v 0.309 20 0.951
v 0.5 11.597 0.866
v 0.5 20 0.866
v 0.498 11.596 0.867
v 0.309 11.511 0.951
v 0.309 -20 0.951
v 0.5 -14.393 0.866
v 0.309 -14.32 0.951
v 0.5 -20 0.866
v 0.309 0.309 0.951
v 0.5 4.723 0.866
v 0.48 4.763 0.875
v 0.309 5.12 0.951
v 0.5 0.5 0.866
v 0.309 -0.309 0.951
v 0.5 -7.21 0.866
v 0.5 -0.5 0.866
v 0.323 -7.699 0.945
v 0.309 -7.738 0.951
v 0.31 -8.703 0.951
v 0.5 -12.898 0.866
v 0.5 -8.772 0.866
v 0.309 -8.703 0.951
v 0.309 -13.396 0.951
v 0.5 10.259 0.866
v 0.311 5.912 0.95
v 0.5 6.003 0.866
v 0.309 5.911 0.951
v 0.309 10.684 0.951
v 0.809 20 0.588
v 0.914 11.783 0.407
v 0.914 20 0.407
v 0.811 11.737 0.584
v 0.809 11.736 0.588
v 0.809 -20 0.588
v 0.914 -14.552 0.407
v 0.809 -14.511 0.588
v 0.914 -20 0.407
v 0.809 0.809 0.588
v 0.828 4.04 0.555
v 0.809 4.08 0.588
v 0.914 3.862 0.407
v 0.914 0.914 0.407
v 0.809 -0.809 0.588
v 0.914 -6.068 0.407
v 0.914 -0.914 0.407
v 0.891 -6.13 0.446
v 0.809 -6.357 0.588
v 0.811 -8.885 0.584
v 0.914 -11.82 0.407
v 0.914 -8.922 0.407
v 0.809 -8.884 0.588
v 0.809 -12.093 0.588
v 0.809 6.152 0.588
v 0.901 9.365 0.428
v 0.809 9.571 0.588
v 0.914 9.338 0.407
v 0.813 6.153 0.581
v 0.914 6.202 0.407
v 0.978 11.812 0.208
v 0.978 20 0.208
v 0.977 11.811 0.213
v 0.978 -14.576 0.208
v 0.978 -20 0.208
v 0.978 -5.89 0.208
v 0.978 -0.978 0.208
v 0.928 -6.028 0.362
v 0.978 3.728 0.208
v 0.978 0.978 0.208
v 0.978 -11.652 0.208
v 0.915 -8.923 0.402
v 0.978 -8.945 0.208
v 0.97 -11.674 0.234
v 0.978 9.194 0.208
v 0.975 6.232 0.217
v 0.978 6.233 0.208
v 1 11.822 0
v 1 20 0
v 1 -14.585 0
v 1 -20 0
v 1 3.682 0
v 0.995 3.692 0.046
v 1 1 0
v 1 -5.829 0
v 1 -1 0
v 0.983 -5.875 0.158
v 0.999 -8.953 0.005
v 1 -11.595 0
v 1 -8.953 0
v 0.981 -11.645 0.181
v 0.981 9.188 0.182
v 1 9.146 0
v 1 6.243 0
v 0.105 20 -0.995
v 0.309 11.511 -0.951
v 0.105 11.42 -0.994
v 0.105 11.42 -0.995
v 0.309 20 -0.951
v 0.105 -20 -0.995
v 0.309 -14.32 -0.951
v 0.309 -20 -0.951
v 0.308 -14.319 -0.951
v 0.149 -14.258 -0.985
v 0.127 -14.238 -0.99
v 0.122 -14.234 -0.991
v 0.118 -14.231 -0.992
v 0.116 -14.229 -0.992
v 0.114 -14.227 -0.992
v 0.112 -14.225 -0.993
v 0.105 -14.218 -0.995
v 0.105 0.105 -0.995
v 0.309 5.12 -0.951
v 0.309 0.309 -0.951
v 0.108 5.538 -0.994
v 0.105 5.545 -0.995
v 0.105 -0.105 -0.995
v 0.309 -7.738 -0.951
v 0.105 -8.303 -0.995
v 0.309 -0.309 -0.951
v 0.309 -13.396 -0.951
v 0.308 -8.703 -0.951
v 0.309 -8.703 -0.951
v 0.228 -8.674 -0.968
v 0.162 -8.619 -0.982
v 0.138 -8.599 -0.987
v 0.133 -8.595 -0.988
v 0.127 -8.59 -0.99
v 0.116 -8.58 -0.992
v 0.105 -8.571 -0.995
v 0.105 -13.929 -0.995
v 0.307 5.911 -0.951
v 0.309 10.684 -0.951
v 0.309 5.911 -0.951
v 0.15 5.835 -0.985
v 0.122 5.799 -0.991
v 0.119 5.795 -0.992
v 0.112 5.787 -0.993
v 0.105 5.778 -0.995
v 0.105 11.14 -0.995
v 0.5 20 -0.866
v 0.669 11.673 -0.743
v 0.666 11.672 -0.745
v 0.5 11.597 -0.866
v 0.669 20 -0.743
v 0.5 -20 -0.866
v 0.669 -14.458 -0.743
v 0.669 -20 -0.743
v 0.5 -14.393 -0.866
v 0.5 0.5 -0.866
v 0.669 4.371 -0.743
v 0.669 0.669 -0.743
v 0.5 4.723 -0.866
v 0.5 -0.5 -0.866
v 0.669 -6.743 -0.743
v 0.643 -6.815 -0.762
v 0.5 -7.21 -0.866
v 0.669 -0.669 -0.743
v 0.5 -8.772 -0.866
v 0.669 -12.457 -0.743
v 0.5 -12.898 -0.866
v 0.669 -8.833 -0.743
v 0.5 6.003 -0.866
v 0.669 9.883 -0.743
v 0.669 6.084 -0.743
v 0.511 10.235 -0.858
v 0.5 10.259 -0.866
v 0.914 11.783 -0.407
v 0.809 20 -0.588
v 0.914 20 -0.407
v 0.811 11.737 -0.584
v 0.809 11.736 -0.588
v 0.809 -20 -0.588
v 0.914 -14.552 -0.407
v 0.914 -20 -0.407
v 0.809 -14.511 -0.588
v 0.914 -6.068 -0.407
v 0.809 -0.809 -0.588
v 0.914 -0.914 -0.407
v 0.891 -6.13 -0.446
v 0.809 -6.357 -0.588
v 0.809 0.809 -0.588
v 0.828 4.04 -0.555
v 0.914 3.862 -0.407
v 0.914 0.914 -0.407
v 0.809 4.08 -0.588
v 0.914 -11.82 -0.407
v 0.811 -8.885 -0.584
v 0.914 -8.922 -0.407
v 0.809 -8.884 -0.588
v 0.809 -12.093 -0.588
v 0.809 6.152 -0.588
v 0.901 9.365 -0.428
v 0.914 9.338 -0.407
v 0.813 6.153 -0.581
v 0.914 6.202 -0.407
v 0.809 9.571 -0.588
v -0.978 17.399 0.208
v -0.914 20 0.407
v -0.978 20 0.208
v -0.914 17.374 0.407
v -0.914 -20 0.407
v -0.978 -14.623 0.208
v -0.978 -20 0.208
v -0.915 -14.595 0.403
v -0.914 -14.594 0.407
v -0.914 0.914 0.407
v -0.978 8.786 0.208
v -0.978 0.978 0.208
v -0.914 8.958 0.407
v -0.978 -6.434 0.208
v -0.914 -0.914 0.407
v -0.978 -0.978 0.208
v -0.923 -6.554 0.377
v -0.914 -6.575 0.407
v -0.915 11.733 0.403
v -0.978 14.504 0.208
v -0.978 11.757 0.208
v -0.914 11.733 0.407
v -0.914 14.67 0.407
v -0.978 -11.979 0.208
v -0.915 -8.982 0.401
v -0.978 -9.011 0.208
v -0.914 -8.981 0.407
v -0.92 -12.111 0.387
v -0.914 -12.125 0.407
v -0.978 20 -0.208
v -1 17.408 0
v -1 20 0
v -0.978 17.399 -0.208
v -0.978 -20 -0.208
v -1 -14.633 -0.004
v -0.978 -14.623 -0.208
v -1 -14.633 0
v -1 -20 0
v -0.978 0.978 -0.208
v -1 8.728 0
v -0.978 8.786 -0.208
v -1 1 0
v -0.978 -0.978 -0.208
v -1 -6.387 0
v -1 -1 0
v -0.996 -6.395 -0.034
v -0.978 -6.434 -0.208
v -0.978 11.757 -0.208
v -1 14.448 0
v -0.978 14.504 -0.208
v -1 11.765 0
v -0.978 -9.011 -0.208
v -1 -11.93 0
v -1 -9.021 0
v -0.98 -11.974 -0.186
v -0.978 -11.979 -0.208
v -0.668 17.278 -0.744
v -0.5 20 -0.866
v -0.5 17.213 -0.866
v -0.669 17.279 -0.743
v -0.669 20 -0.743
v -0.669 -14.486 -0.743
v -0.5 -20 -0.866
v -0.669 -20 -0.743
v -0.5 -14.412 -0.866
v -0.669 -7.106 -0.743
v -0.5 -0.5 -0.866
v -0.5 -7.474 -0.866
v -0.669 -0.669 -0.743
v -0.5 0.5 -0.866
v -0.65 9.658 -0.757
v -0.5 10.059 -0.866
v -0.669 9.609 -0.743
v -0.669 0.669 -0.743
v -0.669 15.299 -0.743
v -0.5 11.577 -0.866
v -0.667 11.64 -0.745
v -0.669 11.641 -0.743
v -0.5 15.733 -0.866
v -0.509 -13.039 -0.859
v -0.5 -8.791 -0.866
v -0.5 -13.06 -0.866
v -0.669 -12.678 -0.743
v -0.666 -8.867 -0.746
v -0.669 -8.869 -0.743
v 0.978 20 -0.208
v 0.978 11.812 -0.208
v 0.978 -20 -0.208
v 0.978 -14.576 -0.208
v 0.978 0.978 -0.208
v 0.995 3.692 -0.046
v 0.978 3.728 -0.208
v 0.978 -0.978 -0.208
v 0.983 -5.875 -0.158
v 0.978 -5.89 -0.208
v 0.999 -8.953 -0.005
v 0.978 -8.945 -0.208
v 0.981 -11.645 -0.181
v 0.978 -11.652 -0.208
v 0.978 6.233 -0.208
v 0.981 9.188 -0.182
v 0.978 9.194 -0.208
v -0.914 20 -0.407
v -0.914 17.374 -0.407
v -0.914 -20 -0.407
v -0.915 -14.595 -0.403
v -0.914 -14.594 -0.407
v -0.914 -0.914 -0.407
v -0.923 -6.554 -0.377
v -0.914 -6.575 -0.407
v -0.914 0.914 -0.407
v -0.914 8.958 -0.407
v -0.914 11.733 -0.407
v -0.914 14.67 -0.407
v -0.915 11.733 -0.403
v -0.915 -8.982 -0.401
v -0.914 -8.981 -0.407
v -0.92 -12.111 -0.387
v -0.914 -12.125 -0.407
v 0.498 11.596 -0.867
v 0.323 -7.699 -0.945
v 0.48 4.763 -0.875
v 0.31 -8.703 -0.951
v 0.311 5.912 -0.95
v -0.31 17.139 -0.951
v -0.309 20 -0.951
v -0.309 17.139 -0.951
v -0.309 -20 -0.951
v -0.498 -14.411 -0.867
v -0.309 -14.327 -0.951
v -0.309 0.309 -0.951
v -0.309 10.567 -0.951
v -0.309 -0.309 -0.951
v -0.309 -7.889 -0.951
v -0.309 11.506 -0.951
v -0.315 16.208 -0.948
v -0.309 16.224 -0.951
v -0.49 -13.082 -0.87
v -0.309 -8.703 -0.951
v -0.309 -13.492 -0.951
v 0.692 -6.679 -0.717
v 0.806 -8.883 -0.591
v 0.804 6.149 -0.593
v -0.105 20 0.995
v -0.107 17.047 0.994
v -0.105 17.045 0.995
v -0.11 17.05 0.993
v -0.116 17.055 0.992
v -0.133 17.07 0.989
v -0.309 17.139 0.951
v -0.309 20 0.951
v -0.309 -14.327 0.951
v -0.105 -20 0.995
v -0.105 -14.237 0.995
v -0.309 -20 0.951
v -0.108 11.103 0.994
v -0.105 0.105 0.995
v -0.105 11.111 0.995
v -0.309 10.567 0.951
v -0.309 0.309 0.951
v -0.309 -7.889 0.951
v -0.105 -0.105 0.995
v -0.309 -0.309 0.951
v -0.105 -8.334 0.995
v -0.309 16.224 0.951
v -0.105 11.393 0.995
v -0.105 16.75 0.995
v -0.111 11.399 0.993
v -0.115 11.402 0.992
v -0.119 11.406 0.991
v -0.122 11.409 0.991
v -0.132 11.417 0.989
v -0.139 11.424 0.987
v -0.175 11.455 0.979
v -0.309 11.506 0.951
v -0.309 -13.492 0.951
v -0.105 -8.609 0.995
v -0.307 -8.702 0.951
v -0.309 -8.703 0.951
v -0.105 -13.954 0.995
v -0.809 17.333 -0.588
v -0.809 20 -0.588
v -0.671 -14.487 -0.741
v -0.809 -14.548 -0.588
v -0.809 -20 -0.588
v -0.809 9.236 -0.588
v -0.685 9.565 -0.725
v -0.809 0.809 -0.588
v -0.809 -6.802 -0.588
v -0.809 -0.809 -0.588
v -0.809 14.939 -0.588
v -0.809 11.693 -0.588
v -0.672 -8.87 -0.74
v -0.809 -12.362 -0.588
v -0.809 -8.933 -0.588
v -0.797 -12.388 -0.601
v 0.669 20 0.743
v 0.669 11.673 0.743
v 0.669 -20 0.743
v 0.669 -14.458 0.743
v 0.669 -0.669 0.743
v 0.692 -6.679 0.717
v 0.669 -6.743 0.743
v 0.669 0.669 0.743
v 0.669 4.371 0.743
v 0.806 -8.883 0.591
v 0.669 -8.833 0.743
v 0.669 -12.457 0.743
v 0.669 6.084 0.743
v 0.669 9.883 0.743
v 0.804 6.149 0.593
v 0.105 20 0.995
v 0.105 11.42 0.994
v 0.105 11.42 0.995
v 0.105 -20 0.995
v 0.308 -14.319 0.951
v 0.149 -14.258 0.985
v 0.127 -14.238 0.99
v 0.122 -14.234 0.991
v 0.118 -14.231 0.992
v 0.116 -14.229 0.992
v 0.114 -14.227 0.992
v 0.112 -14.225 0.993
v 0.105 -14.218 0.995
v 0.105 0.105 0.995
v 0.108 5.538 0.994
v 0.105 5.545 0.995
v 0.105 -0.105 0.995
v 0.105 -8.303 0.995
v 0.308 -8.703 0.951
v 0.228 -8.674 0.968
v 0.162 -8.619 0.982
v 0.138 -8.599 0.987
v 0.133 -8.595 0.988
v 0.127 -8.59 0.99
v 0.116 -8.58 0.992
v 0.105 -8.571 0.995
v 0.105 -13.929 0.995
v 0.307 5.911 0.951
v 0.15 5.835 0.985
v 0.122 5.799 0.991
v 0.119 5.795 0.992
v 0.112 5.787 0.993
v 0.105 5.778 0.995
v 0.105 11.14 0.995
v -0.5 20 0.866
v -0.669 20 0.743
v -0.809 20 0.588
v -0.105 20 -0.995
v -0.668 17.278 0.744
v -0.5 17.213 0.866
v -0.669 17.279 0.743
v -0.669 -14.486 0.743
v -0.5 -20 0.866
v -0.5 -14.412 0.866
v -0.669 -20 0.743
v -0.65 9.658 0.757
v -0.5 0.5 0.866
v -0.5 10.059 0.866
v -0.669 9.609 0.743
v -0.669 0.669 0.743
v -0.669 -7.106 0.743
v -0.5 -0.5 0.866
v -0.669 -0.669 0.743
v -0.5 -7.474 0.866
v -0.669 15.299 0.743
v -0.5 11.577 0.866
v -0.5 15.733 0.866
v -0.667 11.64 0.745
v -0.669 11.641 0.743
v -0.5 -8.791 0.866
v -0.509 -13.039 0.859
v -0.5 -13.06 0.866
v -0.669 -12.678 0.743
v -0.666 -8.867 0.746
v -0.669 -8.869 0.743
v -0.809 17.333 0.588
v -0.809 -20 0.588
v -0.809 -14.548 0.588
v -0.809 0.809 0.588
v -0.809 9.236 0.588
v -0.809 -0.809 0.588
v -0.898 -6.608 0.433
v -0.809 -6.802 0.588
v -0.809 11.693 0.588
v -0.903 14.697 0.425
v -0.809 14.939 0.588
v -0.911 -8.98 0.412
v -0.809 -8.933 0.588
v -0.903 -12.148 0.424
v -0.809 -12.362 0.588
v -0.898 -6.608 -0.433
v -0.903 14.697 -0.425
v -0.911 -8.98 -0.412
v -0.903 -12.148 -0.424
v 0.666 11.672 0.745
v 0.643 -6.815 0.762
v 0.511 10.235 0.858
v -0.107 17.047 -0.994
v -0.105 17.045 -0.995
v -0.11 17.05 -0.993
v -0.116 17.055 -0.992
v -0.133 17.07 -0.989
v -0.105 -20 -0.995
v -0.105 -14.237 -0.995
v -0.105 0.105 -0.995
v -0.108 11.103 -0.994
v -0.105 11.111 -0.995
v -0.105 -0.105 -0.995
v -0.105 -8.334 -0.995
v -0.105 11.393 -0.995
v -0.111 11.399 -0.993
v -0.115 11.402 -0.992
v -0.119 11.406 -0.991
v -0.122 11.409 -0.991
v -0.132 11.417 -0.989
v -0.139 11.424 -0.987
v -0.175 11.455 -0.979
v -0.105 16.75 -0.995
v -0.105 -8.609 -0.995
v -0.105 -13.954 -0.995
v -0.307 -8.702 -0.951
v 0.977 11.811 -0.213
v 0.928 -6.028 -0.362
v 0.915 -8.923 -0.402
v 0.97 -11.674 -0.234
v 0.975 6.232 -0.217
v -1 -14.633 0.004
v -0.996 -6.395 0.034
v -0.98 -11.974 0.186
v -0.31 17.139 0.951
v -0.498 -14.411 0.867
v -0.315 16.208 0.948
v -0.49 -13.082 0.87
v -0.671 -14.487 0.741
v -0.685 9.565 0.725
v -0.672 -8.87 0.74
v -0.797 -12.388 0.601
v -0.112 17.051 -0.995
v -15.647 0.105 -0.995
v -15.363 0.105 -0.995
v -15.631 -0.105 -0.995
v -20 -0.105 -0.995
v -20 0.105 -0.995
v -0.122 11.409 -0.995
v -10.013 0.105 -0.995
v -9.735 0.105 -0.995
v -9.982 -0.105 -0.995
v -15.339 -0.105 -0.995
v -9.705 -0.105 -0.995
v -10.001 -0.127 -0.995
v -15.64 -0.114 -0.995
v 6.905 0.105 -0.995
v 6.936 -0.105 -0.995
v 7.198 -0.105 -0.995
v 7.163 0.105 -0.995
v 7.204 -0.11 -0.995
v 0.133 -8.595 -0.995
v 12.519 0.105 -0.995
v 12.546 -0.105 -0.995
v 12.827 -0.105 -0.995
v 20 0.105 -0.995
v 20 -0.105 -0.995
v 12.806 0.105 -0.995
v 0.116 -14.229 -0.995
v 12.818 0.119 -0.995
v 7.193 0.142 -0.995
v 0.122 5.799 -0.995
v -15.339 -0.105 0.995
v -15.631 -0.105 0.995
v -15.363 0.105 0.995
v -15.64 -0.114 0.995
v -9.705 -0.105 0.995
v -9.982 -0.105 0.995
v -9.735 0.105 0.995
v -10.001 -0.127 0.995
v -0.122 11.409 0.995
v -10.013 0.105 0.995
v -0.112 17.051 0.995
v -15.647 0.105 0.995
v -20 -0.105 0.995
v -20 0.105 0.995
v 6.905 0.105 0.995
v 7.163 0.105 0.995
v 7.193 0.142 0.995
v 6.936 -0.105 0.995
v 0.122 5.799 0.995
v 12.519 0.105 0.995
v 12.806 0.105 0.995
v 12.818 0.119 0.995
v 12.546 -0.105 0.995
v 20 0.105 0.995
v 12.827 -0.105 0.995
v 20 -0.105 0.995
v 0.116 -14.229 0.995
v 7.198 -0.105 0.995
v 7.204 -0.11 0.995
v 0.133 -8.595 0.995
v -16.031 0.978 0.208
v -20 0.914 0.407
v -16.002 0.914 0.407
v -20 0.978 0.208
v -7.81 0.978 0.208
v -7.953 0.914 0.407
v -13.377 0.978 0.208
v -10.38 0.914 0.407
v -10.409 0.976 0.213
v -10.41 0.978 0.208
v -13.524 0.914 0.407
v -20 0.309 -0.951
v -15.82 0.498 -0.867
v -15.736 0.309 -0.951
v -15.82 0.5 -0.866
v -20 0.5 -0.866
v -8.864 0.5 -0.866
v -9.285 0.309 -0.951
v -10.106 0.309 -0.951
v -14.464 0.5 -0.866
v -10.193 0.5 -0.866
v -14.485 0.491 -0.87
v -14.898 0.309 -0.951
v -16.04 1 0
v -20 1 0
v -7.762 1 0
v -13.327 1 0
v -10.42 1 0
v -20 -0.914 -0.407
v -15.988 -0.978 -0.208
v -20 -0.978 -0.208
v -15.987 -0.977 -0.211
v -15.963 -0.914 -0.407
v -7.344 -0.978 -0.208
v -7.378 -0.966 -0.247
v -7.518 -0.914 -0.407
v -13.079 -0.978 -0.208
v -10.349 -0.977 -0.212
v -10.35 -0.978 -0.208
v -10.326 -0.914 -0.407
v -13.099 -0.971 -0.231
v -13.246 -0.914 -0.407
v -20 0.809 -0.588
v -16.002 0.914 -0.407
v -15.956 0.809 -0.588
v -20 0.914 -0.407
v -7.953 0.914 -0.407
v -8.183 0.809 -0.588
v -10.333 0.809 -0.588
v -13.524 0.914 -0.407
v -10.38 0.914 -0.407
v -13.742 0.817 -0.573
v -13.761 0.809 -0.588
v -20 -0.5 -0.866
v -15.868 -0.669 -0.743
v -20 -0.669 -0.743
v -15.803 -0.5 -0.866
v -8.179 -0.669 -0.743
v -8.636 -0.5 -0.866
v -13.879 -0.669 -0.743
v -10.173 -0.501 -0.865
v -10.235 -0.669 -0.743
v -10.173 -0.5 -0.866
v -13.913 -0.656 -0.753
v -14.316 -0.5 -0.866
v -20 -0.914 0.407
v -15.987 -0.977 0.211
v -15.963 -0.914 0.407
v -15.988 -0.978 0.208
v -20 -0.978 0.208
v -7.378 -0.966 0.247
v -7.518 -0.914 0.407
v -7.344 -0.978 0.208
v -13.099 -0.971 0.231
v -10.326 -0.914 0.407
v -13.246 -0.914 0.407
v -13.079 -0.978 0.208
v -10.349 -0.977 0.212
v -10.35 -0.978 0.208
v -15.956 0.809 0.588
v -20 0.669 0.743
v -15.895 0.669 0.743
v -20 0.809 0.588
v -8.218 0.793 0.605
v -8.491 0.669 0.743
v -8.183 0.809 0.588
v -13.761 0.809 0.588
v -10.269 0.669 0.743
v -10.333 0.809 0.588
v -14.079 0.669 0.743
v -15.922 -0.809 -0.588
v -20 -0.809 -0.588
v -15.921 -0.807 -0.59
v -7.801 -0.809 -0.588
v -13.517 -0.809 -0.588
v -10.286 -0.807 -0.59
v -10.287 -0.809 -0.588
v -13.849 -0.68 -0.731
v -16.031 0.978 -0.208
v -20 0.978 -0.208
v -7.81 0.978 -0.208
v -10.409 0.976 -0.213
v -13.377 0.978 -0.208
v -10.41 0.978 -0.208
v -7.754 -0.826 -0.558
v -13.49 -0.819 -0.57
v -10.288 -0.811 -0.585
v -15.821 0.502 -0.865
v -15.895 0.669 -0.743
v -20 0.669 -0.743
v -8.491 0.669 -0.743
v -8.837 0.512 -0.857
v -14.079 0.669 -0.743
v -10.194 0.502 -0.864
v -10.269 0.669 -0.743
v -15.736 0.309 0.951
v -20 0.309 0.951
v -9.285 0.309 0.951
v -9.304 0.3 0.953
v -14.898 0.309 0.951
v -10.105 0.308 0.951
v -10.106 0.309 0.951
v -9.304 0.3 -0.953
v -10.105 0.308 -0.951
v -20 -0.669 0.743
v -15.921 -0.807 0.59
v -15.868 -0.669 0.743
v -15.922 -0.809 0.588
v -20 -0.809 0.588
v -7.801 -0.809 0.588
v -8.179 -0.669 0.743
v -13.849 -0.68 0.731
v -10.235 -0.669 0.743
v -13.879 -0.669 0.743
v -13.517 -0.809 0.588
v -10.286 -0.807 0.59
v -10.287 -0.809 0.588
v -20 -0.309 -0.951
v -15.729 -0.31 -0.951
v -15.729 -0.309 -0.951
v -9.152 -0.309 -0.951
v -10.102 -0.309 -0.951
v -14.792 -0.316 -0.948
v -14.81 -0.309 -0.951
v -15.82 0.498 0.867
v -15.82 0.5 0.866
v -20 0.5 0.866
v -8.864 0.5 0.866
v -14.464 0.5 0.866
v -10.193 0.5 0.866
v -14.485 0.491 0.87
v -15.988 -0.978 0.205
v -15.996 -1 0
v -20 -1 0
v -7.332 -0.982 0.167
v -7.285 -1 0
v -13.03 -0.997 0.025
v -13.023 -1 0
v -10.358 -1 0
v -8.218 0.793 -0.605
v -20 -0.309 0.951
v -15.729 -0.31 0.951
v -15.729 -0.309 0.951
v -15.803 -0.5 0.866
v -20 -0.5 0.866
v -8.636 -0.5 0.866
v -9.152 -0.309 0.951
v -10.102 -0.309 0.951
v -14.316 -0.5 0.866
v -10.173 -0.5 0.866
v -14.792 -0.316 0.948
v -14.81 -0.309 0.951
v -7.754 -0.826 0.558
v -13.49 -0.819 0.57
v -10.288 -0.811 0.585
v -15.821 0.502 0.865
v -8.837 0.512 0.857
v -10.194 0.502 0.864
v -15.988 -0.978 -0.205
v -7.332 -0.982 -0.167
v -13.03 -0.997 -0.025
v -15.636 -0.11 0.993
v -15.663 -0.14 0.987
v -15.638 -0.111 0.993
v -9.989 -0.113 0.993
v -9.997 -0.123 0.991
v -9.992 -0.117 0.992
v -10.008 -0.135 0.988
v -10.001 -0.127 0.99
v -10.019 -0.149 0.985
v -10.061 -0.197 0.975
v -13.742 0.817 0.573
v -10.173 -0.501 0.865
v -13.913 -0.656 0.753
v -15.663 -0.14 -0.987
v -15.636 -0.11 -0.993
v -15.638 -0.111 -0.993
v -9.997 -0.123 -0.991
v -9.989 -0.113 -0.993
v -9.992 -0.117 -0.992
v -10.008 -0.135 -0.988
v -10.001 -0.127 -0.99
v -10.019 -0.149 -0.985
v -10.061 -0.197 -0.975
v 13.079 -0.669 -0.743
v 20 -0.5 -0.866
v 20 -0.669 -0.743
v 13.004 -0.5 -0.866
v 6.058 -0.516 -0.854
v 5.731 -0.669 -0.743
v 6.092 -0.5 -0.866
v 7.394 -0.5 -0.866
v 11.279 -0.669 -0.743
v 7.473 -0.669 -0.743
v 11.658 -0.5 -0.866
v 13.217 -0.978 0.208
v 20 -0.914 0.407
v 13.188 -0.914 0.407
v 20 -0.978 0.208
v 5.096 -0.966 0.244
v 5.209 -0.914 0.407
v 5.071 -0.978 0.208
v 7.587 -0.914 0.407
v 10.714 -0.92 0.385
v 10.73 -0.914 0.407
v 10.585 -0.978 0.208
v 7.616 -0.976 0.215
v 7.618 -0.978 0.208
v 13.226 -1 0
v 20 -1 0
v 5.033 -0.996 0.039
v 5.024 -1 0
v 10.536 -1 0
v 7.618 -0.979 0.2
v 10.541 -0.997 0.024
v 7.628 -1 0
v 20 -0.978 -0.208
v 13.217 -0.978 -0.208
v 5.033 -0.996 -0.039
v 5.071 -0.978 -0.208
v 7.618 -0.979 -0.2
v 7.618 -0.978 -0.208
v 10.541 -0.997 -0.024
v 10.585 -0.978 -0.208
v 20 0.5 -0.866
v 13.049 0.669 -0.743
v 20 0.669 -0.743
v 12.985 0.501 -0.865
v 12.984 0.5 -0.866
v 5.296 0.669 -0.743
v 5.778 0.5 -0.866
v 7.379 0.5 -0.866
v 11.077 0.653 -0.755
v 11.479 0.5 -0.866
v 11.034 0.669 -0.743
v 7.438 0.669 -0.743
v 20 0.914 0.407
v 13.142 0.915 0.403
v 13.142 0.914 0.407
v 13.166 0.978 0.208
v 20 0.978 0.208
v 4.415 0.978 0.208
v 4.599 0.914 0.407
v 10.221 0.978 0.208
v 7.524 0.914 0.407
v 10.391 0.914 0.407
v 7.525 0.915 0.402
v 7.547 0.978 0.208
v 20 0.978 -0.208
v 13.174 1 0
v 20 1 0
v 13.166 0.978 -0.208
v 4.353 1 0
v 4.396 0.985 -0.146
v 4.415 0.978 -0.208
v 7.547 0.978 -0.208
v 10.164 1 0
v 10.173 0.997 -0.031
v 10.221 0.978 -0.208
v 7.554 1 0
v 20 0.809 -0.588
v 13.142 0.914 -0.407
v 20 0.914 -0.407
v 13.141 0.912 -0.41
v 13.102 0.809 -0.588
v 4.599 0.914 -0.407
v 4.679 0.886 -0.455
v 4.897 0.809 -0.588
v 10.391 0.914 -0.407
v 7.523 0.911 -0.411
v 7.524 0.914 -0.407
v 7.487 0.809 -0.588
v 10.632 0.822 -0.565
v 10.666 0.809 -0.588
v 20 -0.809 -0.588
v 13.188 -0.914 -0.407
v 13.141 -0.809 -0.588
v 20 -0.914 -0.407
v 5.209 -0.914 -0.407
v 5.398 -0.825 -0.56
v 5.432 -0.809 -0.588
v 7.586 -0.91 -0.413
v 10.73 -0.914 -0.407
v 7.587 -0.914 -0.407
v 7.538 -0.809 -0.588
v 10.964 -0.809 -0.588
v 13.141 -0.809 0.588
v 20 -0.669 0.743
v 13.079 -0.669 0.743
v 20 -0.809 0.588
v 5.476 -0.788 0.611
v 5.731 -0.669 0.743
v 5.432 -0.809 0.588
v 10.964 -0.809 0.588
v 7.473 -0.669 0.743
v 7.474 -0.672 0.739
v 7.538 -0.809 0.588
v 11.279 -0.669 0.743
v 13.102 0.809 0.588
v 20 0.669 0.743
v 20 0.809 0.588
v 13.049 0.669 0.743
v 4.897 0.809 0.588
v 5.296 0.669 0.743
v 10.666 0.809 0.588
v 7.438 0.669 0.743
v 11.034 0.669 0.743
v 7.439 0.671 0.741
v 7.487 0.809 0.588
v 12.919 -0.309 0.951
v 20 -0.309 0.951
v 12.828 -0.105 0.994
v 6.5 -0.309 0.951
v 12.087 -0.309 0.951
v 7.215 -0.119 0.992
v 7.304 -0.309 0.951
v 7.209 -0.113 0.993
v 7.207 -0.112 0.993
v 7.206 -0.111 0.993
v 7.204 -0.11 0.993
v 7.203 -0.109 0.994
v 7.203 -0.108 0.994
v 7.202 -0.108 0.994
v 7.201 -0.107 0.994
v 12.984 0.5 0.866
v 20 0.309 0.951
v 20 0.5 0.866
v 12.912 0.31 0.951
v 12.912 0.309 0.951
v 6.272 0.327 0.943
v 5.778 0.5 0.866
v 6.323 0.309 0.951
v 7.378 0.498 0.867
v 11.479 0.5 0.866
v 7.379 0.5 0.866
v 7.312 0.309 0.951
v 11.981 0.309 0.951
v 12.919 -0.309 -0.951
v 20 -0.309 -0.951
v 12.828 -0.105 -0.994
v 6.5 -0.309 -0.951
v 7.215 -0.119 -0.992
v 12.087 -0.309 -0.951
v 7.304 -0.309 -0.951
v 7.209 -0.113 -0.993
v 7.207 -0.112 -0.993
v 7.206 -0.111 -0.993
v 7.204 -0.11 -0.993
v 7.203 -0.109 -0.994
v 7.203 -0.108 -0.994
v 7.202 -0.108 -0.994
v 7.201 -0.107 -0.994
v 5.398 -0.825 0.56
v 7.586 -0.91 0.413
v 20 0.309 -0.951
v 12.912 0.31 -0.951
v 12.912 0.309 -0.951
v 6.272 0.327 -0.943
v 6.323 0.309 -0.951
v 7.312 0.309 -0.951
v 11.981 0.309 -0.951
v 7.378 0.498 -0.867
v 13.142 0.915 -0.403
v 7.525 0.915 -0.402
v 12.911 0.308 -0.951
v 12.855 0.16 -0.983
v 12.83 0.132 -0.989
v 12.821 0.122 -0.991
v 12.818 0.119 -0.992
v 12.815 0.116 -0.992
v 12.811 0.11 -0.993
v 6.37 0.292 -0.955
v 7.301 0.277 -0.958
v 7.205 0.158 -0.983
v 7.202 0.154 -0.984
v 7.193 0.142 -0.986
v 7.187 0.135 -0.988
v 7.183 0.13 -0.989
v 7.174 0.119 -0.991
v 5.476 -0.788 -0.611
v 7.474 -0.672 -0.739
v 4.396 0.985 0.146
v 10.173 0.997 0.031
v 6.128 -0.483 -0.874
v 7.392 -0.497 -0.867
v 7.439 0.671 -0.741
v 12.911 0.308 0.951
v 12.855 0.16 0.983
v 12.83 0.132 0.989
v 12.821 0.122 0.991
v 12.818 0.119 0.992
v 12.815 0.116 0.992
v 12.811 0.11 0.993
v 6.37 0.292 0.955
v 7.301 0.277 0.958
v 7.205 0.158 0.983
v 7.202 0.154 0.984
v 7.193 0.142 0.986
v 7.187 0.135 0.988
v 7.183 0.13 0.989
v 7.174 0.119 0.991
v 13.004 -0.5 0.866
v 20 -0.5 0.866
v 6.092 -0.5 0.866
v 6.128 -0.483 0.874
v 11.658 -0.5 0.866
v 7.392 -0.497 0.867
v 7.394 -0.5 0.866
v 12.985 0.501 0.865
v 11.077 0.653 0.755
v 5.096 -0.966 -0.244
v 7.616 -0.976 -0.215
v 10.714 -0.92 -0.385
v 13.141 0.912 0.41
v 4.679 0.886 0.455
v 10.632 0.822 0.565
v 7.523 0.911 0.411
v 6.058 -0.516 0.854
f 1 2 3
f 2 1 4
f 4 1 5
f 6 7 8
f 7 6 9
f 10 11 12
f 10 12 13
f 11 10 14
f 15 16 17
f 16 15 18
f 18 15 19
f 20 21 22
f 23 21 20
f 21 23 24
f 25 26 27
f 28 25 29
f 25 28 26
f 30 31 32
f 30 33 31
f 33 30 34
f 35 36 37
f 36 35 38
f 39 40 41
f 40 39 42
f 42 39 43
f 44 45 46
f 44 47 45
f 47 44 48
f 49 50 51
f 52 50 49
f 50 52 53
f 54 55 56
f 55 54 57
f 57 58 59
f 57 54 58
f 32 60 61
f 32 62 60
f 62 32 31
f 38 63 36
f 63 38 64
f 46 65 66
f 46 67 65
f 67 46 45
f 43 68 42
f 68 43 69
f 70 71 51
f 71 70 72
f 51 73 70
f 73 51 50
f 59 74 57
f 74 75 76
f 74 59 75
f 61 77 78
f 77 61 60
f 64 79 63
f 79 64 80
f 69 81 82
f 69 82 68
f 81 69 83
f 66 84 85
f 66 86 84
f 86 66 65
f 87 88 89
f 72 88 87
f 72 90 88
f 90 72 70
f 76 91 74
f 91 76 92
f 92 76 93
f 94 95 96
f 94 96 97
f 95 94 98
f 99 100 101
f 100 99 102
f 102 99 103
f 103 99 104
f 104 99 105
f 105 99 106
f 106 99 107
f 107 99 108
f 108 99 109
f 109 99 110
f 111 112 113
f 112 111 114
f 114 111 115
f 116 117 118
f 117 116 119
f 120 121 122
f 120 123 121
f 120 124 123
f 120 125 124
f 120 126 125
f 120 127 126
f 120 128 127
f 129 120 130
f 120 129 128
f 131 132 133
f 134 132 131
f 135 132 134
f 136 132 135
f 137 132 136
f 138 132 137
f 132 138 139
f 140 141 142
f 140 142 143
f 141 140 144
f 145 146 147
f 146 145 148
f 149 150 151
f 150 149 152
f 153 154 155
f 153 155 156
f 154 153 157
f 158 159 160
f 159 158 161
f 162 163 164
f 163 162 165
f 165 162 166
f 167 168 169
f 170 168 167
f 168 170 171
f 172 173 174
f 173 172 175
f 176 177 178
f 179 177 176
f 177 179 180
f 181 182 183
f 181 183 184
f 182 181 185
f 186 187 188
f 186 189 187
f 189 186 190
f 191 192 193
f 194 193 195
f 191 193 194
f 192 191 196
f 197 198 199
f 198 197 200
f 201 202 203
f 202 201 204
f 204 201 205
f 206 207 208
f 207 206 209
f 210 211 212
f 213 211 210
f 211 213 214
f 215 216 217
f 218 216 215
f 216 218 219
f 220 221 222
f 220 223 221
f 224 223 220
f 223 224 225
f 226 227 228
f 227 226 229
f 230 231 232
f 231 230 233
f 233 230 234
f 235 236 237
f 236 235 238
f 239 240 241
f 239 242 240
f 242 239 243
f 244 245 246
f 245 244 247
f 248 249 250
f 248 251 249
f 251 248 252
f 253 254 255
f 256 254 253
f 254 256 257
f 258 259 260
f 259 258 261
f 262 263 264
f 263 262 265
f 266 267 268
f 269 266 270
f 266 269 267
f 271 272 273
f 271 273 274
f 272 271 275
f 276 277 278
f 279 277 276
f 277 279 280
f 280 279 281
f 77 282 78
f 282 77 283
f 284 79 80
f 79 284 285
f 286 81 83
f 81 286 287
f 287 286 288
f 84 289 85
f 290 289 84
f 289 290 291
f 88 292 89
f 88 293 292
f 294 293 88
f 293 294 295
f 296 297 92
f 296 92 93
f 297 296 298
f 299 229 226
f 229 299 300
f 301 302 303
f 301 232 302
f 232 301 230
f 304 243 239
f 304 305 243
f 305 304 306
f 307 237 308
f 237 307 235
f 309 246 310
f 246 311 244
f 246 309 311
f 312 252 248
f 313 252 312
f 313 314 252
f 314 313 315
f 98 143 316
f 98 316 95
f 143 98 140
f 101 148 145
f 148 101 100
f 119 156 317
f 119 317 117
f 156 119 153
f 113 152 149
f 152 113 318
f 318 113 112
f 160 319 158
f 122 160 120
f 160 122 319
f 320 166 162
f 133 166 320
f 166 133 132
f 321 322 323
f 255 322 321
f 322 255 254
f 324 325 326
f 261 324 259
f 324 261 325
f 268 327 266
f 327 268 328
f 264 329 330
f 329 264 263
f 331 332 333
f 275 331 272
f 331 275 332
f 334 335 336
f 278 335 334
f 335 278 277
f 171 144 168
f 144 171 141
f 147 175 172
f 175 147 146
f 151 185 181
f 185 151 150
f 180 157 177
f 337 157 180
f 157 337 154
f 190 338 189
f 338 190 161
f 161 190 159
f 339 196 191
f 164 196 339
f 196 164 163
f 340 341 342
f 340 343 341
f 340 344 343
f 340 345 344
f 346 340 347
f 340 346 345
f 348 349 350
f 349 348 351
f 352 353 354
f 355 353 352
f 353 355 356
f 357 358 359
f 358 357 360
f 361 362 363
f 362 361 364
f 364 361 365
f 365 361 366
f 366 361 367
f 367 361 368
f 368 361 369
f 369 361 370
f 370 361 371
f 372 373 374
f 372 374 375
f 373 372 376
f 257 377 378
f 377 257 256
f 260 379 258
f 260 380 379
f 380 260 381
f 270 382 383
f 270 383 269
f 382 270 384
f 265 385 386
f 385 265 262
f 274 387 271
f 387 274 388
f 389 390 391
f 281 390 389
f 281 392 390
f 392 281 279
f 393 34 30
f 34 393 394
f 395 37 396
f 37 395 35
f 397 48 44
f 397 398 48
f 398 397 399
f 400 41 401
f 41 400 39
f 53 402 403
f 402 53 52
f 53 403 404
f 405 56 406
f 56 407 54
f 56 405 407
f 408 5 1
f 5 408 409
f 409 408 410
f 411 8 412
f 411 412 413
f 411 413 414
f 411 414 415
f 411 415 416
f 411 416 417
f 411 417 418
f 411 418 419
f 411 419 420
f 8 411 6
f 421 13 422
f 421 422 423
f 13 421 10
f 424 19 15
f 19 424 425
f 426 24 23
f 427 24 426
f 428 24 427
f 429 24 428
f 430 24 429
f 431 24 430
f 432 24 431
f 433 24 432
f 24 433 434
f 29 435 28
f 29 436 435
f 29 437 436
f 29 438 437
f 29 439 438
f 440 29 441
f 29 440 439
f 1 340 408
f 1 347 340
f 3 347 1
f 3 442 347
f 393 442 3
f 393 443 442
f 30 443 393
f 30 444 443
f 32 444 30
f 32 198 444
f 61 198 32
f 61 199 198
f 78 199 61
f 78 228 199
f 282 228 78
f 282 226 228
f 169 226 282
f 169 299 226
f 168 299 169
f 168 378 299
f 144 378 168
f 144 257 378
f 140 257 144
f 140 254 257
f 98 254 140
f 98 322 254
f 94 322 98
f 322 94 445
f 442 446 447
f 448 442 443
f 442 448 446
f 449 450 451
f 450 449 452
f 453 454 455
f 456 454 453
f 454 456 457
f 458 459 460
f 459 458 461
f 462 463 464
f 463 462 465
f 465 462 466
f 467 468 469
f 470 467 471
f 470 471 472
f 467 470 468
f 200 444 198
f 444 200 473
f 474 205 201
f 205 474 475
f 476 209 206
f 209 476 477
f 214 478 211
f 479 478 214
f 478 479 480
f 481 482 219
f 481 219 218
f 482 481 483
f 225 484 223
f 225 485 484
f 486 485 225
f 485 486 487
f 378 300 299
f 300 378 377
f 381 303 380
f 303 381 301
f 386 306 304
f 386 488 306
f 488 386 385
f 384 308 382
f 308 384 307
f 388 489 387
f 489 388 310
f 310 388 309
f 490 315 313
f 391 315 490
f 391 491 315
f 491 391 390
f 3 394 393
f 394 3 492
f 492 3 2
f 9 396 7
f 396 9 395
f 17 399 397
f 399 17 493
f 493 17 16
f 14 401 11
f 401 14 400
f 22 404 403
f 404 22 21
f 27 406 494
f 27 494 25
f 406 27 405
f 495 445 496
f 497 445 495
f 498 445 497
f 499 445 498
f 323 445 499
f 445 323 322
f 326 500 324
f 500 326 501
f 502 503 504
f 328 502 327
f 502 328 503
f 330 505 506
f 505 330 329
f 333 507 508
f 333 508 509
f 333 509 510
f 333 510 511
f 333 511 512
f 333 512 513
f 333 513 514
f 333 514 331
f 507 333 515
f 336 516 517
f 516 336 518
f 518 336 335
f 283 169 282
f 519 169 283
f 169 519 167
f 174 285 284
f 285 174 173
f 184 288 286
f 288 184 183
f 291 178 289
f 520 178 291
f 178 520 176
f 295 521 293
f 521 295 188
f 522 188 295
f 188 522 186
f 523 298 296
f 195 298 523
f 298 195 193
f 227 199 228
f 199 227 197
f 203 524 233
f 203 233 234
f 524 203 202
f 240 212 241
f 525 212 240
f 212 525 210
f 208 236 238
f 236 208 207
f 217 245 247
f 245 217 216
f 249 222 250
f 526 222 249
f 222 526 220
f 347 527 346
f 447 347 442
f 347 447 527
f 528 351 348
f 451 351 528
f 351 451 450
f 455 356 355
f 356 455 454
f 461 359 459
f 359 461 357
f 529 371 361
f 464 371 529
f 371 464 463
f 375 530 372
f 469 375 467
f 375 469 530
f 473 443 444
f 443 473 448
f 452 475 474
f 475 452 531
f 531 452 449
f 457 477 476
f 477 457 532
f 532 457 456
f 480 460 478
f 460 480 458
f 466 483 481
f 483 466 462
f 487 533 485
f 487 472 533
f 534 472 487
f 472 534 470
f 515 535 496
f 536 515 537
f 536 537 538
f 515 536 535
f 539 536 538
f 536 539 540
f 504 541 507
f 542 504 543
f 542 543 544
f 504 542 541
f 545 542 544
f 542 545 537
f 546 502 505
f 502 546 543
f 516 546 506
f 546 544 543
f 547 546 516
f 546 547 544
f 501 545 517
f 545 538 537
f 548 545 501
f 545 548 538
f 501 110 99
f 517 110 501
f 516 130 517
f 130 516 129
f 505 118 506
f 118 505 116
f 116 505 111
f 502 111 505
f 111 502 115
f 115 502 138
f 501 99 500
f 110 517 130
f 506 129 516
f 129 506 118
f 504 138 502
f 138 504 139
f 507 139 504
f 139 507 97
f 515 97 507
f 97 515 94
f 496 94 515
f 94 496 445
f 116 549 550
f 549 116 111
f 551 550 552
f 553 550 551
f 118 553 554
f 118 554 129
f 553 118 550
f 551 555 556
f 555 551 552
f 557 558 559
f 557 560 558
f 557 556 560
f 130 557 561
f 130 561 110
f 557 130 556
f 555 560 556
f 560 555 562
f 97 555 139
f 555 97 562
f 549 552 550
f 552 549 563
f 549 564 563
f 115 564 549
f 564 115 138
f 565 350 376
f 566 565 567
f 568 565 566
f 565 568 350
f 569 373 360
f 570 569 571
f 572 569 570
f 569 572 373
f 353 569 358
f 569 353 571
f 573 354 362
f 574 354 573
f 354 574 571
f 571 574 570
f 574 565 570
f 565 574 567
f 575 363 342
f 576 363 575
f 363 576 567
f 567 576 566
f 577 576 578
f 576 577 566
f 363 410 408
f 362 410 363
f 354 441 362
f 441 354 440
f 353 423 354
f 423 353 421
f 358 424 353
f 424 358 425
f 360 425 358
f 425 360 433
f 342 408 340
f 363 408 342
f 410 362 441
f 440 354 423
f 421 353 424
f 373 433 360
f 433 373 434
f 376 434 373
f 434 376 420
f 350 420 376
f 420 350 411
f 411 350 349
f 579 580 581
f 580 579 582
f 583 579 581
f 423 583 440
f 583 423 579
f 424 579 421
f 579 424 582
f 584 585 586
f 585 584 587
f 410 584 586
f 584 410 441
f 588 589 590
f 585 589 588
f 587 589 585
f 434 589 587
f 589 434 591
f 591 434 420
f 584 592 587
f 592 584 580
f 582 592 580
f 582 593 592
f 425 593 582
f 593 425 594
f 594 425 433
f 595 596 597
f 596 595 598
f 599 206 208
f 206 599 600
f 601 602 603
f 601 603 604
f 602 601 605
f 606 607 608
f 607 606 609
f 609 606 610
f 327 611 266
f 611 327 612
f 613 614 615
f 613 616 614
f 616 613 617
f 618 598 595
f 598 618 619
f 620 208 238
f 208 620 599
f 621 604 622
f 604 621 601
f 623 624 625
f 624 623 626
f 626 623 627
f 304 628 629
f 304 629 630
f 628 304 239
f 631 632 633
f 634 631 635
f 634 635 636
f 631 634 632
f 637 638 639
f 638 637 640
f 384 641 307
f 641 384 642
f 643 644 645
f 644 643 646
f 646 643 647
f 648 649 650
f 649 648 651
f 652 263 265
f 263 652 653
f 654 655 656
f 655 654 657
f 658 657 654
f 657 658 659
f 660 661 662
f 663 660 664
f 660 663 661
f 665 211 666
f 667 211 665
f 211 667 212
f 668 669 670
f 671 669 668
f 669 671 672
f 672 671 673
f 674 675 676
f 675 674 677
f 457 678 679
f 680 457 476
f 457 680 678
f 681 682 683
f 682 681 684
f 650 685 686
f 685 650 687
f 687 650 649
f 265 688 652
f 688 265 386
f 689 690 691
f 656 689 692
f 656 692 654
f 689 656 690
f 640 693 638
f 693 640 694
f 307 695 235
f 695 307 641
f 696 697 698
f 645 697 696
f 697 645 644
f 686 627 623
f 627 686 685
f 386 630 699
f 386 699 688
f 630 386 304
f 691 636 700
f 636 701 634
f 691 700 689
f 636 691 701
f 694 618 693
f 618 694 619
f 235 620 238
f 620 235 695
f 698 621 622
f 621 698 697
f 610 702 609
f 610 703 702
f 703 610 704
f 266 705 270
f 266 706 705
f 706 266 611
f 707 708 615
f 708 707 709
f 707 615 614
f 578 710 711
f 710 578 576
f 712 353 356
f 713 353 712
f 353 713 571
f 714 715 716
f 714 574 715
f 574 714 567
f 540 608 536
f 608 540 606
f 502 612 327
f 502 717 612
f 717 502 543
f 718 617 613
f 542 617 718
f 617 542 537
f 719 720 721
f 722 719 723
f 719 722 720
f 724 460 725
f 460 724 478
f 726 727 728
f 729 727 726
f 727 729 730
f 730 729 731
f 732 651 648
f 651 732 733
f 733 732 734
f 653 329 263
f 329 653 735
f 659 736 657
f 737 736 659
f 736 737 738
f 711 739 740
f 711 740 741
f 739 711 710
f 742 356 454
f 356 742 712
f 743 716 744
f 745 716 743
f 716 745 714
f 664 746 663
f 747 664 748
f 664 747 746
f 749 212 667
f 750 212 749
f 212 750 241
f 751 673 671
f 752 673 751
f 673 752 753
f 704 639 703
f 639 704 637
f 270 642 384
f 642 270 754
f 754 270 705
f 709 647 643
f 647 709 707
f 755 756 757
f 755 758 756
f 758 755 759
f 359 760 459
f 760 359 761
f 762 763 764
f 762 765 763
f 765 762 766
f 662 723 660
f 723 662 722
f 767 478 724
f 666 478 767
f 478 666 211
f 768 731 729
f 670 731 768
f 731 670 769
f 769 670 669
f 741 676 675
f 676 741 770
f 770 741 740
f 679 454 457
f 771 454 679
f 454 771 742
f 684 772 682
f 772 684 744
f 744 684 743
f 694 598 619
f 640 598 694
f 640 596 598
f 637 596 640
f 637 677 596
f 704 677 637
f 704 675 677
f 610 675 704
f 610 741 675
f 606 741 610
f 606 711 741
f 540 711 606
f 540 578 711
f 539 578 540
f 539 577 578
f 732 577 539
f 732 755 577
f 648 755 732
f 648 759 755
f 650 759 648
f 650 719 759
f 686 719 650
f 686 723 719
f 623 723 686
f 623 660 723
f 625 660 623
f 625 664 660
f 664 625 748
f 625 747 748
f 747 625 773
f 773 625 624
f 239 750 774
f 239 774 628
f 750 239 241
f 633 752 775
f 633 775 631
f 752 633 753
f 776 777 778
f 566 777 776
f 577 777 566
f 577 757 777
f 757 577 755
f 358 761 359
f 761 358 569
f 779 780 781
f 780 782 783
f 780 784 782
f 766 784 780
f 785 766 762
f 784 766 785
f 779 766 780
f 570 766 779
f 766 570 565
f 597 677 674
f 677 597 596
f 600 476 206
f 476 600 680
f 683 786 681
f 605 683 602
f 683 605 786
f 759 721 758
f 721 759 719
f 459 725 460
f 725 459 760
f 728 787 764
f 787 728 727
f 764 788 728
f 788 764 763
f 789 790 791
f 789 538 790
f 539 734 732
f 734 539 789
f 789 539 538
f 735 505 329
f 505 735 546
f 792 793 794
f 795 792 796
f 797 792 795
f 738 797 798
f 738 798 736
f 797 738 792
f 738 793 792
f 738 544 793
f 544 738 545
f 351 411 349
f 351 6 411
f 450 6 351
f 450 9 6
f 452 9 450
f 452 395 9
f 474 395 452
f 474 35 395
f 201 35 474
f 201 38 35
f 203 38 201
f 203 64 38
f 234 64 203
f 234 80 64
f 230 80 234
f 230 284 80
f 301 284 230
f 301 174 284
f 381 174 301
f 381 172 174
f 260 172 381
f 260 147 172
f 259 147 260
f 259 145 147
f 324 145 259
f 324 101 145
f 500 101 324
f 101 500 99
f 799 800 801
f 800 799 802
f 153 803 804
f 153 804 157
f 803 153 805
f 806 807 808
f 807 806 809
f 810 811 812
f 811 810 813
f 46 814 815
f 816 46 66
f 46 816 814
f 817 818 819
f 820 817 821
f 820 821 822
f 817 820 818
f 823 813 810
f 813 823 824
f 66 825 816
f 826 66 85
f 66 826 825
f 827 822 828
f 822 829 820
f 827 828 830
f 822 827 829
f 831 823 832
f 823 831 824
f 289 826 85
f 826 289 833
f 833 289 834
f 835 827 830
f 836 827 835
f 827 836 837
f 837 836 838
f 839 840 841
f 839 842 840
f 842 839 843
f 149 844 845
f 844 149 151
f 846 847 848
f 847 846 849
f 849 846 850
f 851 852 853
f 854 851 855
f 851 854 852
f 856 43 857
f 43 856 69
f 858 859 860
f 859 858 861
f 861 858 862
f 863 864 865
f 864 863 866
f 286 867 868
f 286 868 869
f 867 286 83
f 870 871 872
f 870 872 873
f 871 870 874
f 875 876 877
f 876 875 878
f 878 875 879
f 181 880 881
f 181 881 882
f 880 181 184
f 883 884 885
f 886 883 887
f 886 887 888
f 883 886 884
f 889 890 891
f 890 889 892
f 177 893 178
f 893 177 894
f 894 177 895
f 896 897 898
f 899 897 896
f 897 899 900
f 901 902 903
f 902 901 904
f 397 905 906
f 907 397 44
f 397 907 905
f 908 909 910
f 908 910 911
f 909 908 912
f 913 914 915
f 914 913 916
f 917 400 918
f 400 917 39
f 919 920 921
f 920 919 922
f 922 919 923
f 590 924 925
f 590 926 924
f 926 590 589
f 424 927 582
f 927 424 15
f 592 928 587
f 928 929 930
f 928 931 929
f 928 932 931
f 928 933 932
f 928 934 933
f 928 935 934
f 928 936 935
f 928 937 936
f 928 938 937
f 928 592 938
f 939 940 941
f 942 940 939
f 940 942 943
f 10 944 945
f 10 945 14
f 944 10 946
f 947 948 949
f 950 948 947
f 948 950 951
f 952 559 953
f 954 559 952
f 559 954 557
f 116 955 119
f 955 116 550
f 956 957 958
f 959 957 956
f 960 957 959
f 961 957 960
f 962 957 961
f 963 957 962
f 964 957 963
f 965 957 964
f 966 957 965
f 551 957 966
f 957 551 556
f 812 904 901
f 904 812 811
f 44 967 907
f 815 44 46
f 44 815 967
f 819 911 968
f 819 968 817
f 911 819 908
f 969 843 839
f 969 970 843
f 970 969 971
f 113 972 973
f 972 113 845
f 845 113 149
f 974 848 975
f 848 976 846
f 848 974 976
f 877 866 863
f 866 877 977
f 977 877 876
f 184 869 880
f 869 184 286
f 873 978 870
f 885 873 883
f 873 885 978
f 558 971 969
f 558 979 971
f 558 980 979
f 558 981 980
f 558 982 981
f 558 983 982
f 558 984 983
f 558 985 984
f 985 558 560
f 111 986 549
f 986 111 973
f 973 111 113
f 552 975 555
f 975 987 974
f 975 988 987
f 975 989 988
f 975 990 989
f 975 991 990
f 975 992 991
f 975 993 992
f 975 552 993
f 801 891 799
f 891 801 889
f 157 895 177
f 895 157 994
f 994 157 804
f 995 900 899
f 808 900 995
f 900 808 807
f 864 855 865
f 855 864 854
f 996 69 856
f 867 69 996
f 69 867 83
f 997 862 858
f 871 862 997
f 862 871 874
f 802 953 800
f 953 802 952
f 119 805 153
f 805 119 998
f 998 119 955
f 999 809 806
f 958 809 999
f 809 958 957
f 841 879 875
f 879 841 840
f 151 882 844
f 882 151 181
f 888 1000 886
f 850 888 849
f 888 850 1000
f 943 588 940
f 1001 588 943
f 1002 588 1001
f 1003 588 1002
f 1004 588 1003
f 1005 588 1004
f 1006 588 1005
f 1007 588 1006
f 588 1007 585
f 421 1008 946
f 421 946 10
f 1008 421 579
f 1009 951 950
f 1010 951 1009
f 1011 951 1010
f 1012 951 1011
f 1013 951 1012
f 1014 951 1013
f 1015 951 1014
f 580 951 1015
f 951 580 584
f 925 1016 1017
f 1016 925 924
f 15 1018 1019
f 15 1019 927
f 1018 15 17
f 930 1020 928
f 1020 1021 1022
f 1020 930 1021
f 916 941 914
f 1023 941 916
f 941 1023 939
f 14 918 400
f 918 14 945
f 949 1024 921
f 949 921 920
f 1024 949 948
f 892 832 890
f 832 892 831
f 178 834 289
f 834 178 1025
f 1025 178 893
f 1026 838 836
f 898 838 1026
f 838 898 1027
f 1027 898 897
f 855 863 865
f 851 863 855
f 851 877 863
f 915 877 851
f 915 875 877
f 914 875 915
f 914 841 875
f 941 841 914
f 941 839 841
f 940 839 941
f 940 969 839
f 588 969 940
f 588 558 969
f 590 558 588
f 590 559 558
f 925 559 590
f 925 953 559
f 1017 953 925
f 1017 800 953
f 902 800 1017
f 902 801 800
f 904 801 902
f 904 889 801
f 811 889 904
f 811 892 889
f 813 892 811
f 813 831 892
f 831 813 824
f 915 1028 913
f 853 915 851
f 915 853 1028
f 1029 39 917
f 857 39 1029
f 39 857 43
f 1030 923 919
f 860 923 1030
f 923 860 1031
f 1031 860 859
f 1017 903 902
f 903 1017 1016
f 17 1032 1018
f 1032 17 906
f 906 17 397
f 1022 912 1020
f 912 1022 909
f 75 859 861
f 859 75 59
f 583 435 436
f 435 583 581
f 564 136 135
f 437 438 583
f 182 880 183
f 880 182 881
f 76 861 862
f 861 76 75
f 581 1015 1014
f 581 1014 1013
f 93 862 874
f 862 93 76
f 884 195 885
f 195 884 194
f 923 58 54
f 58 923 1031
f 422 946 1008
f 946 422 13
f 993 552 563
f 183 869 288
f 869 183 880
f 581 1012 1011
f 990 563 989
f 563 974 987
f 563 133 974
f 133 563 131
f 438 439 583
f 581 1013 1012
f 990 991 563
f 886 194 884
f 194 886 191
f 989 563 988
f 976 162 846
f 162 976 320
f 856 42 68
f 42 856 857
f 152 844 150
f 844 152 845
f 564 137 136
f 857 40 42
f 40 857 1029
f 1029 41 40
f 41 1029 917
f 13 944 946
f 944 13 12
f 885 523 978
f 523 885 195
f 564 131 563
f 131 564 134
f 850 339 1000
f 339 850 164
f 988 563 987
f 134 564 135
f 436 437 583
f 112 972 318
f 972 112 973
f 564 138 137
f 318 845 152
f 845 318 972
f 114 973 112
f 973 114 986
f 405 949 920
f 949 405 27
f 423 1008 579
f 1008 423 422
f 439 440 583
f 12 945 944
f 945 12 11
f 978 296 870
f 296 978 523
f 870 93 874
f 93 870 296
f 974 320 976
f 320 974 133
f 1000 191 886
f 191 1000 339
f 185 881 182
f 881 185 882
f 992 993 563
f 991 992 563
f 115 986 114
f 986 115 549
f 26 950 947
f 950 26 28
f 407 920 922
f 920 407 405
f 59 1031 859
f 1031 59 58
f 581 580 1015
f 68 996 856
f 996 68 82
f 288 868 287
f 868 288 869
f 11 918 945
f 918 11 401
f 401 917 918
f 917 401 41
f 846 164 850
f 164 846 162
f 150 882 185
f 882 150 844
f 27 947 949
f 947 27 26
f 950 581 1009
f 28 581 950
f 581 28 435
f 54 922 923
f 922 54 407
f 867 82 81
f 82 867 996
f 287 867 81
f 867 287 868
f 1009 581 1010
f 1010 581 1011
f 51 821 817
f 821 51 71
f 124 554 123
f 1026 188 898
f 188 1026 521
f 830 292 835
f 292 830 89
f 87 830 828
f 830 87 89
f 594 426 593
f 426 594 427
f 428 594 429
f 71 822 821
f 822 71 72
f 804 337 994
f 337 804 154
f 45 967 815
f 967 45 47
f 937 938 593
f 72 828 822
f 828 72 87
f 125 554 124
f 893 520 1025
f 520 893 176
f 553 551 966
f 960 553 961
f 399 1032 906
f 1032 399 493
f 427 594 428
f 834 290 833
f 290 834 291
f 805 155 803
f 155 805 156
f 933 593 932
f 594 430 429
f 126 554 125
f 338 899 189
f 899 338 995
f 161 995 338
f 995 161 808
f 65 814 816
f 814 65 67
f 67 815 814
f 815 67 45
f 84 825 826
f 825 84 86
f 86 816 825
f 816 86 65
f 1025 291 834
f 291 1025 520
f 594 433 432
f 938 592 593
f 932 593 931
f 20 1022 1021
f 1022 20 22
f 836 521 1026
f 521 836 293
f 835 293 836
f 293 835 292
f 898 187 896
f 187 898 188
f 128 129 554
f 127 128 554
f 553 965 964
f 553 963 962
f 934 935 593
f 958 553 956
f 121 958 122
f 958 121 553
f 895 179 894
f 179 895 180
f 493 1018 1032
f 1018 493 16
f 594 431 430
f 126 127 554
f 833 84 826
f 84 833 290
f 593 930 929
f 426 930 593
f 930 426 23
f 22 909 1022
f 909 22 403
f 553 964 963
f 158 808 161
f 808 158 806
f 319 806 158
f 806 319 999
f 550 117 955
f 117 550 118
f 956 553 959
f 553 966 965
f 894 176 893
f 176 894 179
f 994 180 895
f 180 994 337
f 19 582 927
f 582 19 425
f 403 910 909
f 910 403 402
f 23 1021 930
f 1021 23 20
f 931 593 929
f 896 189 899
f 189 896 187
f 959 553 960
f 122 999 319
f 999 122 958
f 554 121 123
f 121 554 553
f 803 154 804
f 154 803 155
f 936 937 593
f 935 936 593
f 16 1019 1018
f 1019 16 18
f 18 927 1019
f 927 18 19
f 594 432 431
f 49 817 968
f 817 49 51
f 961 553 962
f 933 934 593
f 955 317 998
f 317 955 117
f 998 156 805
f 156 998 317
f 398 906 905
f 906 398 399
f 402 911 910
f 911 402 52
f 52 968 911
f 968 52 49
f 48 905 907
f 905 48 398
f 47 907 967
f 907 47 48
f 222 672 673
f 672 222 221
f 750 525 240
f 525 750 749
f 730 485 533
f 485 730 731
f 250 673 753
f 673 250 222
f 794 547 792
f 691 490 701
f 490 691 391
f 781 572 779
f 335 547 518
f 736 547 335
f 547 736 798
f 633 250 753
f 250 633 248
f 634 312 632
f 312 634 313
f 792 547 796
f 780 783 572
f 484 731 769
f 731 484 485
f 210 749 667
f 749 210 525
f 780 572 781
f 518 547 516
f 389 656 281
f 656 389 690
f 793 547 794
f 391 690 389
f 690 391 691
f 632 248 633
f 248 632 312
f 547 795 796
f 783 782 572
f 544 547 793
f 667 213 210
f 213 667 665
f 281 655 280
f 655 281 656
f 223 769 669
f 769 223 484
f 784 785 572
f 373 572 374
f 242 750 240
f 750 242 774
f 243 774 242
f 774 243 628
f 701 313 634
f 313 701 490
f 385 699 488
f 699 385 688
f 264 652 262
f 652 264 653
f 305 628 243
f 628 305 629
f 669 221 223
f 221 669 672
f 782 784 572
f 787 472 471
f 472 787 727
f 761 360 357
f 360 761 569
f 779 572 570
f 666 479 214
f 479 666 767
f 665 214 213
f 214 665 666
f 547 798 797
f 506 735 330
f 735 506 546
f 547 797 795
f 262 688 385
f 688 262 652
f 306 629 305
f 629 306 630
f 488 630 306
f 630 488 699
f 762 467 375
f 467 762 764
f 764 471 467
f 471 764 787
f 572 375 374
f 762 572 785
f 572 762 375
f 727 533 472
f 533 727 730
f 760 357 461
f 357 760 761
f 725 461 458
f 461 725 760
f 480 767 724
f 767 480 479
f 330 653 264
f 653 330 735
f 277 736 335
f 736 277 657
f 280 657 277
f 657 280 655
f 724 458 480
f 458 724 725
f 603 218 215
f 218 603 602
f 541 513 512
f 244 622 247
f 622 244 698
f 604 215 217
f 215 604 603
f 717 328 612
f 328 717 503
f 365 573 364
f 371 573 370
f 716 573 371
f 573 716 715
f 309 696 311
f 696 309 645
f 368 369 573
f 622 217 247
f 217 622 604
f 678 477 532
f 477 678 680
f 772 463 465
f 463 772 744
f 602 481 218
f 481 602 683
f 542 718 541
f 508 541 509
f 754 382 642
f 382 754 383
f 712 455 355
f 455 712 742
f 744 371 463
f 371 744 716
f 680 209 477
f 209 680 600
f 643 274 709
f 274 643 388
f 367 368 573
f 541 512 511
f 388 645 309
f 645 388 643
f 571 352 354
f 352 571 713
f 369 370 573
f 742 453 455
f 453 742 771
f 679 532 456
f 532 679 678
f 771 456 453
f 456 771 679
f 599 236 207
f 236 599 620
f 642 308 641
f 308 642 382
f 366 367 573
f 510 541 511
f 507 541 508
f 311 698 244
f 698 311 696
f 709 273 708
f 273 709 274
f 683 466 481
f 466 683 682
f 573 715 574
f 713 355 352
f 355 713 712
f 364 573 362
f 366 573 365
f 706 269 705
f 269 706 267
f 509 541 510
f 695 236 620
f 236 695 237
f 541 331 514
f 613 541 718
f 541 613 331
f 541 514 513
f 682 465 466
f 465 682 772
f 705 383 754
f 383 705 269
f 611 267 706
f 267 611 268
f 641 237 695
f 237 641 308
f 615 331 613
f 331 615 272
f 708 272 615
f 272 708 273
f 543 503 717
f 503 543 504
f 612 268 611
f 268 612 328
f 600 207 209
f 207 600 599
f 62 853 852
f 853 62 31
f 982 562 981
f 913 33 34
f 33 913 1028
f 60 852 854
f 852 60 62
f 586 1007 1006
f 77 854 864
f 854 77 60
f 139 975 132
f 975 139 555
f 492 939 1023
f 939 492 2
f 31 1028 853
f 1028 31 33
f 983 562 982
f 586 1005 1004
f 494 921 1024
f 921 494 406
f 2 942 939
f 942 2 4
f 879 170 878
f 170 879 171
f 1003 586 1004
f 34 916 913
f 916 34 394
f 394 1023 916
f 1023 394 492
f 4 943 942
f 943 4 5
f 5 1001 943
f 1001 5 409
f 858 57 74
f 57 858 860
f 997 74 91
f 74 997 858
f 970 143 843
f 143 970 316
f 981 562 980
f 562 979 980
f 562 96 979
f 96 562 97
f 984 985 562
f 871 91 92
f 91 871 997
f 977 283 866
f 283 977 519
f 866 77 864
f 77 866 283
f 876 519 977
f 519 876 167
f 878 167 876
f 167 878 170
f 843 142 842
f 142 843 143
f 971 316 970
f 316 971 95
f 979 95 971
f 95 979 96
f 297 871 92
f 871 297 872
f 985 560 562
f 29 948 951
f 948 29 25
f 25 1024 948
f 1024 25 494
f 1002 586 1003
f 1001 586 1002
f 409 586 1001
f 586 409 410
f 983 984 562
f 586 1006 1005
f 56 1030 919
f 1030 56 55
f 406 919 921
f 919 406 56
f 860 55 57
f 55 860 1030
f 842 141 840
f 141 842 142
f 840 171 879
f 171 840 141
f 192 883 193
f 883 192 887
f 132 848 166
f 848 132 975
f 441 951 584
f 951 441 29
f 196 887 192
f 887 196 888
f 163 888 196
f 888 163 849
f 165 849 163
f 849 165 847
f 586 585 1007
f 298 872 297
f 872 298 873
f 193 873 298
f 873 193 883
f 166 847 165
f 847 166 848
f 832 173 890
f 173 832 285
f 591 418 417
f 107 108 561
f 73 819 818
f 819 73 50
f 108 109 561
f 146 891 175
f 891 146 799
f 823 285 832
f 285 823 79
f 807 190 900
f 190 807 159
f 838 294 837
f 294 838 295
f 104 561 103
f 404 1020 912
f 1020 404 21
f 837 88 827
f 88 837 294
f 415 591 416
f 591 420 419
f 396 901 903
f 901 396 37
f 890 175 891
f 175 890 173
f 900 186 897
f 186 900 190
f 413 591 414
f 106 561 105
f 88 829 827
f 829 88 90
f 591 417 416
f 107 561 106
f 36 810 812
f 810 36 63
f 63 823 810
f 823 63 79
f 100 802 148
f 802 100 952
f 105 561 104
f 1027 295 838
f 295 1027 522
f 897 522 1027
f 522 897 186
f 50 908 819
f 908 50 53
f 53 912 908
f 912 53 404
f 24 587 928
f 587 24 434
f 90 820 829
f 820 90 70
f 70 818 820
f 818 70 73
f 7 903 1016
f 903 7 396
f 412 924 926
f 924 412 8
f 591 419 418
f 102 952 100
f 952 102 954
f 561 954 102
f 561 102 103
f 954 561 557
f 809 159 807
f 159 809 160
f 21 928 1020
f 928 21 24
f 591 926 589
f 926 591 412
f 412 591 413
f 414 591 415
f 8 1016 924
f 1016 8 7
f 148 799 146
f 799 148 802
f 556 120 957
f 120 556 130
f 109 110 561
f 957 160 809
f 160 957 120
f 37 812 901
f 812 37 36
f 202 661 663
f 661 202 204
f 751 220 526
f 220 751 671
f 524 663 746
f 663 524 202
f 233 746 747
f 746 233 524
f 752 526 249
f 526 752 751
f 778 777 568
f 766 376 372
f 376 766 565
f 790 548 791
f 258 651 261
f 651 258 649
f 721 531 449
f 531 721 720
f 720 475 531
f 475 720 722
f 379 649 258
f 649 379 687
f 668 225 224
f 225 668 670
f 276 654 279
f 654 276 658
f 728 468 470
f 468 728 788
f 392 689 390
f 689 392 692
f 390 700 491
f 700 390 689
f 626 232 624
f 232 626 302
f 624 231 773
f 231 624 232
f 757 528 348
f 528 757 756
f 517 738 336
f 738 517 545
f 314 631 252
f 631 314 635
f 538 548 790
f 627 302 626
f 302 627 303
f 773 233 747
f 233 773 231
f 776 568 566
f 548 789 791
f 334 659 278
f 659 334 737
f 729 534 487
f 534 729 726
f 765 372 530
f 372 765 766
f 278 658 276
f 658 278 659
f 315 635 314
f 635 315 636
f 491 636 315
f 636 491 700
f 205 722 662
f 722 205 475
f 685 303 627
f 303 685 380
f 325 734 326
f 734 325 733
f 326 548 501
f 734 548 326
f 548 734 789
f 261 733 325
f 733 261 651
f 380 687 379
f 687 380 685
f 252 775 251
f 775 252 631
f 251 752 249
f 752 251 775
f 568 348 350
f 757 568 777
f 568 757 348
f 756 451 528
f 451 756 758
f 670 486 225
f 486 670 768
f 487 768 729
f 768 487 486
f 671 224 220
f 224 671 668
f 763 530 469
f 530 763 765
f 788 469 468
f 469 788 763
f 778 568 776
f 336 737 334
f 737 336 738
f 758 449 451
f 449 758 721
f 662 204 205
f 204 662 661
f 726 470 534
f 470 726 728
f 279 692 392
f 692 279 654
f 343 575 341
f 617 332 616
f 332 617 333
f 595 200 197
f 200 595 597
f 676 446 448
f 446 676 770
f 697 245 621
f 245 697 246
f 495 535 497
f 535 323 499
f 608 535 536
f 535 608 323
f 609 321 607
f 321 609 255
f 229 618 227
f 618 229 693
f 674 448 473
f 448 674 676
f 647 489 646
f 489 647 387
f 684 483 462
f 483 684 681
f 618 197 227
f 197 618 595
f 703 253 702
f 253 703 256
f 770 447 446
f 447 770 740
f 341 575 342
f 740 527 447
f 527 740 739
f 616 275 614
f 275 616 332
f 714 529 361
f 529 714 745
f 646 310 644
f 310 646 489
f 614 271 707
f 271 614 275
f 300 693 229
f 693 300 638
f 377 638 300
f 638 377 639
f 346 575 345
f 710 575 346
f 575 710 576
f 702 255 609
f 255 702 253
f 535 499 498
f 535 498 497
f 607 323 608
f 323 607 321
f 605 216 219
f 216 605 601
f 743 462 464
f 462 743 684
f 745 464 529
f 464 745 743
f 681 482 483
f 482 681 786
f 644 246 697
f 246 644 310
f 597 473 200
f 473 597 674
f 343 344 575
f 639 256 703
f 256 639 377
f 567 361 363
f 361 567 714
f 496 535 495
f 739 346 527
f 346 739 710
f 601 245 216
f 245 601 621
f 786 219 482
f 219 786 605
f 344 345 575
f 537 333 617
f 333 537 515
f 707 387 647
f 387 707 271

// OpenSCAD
$fn=30;
rotate([90,0,0])translate([0, 0, -20])linear_extrude(height = 20)circle(r = 1);
rotate([90,0,90.00])translate([0, 0, -20])linear_extrude(height = 20)circle(r = 1);
rotate([90,0,180.00])translate([0, 0, -20])linear_extrude(height = 20)circle(r = 1);
rotate([90,0,270.00])translate([0, 0, -20])linear_extrude(height = 20)circle(r = 1);



rotate([90,0,51.34])translate([4.5, 0, -3.5277])linear_extrude(height = 9.05538514)circle(r = 1);

rotate([90,0,320.1942])translate([5.5, 0, -4.5278])linear_extrude(height = 11.045361)circle(r = 1);

rotate([90,0,229.3987])translate([6.5, 0, -5.5278])linear_extrude(height = 13.0384)circle(r = 1);


rotate([90,0,138.8141])translate([7.5, 0, -6.5278])linear_extrude(height = 15.0333)circle(r = 1);




rotate([90,0,48.3664])translate([8.5, 0, -7.5278])linear_extrude(height = 17.0294)circle(r = 1);


rotate([90,0,318.0128])translate([9.5, 0, -8.5278])linear_extrude(height = 19.0263)circle(r = 1);

rotate([90,0,227.7263])translate([10.5, 0, -9.5278])linear_extrude(height = 21.0238)circle(r = 1);

rotate([90,0,137.4896])translate([11.5, 0, -10.5278])linear_extrude(height = 23.0217)circle(r = 1);
